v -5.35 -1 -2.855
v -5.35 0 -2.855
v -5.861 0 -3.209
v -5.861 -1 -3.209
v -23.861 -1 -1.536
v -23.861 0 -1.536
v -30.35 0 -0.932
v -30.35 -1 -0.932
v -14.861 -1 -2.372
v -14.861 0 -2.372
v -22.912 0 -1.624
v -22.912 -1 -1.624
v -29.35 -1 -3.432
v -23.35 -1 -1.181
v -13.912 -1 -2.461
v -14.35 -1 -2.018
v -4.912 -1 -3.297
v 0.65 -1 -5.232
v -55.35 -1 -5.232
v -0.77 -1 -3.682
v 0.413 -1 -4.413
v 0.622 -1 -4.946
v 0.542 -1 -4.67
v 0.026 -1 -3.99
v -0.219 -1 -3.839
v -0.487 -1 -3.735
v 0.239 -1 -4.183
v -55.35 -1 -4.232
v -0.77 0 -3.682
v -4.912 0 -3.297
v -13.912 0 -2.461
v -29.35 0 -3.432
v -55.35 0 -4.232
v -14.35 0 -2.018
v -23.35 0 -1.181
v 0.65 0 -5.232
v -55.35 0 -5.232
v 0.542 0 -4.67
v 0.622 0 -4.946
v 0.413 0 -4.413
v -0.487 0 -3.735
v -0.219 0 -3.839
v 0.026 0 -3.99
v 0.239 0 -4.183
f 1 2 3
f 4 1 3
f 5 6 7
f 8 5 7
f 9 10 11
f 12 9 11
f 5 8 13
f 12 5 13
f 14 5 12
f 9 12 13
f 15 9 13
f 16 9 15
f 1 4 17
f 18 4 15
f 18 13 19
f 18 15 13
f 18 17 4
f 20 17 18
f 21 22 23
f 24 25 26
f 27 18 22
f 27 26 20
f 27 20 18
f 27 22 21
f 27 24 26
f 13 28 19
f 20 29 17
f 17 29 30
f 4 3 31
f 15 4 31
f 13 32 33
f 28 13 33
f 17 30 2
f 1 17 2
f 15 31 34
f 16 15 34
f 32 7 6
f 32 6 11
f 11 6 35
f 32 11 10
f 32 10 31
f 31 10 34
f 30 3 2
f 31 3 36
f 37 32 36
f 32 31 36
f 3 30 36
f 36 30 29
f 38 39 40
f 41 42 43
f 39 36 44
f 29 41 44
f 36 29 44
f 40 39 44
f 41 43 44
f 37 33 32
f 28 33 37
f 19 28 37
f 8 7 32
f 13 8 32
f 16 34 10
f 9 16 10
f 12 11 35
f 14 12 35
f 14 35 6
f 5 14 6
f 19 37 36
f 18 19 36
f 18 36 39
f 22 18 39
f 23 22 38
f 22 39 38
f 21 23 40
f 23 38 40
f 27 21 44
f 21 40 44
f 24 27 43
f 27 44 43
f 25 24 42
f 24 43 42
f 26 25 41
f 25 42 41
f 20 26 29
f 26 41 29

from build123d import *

# Parameters (mm, degrees)
F1_DEPTH = 1


with BuildPart() as f1:
    # F0 (on Front) → F1 (new body)
    with BuildSketch(Plane.XZ):
        with BuildLine():
            Line((-55.349811, -4.232354), (-55.349811, -5.232354))
            Line((-55.349811, -5.232354), (0.650189, -5.232354))
            ThreePointArc((0.650189, -5.232354), (0.238892, -4.183401), (-0.770274, -3.682354))
            Line((-0.770274, -3.682354), (-4.912185, -3.297281))
            Line((-4.912185, -3.297281), (-5.349811, -2.85487))
            Line((-5.349811, -2.85487), (-5.861494, -3.209024))
            Line((-5.861494, -3.209024), (-13.912185, -2.460554))
            Line((-13.912185, -2.460554), (-14.349811, -2.018143))
            Line((-14.349811, -2.018143), (-14.861494, -2.372297))
            Line((-14.861494, -2.372297), (-22.912185, -1.623827))
            Line((-22.912185, -1.623827), (-23.349811, -1.181416))
            Line((-23.349811, -1.181416), (-23.861494, -1.53557))
            Line((-23.861494, -1.53557), (-30.349811, -0.932354))
            Line((-30.349811, -0.932354), (-29.349811, -3.432354))
            Line((-29.349811, -3.432354), (-55.349811, -4.232354))
        make_face()
    extrude(amount=F1_DEPTH)


solid = f1.part
